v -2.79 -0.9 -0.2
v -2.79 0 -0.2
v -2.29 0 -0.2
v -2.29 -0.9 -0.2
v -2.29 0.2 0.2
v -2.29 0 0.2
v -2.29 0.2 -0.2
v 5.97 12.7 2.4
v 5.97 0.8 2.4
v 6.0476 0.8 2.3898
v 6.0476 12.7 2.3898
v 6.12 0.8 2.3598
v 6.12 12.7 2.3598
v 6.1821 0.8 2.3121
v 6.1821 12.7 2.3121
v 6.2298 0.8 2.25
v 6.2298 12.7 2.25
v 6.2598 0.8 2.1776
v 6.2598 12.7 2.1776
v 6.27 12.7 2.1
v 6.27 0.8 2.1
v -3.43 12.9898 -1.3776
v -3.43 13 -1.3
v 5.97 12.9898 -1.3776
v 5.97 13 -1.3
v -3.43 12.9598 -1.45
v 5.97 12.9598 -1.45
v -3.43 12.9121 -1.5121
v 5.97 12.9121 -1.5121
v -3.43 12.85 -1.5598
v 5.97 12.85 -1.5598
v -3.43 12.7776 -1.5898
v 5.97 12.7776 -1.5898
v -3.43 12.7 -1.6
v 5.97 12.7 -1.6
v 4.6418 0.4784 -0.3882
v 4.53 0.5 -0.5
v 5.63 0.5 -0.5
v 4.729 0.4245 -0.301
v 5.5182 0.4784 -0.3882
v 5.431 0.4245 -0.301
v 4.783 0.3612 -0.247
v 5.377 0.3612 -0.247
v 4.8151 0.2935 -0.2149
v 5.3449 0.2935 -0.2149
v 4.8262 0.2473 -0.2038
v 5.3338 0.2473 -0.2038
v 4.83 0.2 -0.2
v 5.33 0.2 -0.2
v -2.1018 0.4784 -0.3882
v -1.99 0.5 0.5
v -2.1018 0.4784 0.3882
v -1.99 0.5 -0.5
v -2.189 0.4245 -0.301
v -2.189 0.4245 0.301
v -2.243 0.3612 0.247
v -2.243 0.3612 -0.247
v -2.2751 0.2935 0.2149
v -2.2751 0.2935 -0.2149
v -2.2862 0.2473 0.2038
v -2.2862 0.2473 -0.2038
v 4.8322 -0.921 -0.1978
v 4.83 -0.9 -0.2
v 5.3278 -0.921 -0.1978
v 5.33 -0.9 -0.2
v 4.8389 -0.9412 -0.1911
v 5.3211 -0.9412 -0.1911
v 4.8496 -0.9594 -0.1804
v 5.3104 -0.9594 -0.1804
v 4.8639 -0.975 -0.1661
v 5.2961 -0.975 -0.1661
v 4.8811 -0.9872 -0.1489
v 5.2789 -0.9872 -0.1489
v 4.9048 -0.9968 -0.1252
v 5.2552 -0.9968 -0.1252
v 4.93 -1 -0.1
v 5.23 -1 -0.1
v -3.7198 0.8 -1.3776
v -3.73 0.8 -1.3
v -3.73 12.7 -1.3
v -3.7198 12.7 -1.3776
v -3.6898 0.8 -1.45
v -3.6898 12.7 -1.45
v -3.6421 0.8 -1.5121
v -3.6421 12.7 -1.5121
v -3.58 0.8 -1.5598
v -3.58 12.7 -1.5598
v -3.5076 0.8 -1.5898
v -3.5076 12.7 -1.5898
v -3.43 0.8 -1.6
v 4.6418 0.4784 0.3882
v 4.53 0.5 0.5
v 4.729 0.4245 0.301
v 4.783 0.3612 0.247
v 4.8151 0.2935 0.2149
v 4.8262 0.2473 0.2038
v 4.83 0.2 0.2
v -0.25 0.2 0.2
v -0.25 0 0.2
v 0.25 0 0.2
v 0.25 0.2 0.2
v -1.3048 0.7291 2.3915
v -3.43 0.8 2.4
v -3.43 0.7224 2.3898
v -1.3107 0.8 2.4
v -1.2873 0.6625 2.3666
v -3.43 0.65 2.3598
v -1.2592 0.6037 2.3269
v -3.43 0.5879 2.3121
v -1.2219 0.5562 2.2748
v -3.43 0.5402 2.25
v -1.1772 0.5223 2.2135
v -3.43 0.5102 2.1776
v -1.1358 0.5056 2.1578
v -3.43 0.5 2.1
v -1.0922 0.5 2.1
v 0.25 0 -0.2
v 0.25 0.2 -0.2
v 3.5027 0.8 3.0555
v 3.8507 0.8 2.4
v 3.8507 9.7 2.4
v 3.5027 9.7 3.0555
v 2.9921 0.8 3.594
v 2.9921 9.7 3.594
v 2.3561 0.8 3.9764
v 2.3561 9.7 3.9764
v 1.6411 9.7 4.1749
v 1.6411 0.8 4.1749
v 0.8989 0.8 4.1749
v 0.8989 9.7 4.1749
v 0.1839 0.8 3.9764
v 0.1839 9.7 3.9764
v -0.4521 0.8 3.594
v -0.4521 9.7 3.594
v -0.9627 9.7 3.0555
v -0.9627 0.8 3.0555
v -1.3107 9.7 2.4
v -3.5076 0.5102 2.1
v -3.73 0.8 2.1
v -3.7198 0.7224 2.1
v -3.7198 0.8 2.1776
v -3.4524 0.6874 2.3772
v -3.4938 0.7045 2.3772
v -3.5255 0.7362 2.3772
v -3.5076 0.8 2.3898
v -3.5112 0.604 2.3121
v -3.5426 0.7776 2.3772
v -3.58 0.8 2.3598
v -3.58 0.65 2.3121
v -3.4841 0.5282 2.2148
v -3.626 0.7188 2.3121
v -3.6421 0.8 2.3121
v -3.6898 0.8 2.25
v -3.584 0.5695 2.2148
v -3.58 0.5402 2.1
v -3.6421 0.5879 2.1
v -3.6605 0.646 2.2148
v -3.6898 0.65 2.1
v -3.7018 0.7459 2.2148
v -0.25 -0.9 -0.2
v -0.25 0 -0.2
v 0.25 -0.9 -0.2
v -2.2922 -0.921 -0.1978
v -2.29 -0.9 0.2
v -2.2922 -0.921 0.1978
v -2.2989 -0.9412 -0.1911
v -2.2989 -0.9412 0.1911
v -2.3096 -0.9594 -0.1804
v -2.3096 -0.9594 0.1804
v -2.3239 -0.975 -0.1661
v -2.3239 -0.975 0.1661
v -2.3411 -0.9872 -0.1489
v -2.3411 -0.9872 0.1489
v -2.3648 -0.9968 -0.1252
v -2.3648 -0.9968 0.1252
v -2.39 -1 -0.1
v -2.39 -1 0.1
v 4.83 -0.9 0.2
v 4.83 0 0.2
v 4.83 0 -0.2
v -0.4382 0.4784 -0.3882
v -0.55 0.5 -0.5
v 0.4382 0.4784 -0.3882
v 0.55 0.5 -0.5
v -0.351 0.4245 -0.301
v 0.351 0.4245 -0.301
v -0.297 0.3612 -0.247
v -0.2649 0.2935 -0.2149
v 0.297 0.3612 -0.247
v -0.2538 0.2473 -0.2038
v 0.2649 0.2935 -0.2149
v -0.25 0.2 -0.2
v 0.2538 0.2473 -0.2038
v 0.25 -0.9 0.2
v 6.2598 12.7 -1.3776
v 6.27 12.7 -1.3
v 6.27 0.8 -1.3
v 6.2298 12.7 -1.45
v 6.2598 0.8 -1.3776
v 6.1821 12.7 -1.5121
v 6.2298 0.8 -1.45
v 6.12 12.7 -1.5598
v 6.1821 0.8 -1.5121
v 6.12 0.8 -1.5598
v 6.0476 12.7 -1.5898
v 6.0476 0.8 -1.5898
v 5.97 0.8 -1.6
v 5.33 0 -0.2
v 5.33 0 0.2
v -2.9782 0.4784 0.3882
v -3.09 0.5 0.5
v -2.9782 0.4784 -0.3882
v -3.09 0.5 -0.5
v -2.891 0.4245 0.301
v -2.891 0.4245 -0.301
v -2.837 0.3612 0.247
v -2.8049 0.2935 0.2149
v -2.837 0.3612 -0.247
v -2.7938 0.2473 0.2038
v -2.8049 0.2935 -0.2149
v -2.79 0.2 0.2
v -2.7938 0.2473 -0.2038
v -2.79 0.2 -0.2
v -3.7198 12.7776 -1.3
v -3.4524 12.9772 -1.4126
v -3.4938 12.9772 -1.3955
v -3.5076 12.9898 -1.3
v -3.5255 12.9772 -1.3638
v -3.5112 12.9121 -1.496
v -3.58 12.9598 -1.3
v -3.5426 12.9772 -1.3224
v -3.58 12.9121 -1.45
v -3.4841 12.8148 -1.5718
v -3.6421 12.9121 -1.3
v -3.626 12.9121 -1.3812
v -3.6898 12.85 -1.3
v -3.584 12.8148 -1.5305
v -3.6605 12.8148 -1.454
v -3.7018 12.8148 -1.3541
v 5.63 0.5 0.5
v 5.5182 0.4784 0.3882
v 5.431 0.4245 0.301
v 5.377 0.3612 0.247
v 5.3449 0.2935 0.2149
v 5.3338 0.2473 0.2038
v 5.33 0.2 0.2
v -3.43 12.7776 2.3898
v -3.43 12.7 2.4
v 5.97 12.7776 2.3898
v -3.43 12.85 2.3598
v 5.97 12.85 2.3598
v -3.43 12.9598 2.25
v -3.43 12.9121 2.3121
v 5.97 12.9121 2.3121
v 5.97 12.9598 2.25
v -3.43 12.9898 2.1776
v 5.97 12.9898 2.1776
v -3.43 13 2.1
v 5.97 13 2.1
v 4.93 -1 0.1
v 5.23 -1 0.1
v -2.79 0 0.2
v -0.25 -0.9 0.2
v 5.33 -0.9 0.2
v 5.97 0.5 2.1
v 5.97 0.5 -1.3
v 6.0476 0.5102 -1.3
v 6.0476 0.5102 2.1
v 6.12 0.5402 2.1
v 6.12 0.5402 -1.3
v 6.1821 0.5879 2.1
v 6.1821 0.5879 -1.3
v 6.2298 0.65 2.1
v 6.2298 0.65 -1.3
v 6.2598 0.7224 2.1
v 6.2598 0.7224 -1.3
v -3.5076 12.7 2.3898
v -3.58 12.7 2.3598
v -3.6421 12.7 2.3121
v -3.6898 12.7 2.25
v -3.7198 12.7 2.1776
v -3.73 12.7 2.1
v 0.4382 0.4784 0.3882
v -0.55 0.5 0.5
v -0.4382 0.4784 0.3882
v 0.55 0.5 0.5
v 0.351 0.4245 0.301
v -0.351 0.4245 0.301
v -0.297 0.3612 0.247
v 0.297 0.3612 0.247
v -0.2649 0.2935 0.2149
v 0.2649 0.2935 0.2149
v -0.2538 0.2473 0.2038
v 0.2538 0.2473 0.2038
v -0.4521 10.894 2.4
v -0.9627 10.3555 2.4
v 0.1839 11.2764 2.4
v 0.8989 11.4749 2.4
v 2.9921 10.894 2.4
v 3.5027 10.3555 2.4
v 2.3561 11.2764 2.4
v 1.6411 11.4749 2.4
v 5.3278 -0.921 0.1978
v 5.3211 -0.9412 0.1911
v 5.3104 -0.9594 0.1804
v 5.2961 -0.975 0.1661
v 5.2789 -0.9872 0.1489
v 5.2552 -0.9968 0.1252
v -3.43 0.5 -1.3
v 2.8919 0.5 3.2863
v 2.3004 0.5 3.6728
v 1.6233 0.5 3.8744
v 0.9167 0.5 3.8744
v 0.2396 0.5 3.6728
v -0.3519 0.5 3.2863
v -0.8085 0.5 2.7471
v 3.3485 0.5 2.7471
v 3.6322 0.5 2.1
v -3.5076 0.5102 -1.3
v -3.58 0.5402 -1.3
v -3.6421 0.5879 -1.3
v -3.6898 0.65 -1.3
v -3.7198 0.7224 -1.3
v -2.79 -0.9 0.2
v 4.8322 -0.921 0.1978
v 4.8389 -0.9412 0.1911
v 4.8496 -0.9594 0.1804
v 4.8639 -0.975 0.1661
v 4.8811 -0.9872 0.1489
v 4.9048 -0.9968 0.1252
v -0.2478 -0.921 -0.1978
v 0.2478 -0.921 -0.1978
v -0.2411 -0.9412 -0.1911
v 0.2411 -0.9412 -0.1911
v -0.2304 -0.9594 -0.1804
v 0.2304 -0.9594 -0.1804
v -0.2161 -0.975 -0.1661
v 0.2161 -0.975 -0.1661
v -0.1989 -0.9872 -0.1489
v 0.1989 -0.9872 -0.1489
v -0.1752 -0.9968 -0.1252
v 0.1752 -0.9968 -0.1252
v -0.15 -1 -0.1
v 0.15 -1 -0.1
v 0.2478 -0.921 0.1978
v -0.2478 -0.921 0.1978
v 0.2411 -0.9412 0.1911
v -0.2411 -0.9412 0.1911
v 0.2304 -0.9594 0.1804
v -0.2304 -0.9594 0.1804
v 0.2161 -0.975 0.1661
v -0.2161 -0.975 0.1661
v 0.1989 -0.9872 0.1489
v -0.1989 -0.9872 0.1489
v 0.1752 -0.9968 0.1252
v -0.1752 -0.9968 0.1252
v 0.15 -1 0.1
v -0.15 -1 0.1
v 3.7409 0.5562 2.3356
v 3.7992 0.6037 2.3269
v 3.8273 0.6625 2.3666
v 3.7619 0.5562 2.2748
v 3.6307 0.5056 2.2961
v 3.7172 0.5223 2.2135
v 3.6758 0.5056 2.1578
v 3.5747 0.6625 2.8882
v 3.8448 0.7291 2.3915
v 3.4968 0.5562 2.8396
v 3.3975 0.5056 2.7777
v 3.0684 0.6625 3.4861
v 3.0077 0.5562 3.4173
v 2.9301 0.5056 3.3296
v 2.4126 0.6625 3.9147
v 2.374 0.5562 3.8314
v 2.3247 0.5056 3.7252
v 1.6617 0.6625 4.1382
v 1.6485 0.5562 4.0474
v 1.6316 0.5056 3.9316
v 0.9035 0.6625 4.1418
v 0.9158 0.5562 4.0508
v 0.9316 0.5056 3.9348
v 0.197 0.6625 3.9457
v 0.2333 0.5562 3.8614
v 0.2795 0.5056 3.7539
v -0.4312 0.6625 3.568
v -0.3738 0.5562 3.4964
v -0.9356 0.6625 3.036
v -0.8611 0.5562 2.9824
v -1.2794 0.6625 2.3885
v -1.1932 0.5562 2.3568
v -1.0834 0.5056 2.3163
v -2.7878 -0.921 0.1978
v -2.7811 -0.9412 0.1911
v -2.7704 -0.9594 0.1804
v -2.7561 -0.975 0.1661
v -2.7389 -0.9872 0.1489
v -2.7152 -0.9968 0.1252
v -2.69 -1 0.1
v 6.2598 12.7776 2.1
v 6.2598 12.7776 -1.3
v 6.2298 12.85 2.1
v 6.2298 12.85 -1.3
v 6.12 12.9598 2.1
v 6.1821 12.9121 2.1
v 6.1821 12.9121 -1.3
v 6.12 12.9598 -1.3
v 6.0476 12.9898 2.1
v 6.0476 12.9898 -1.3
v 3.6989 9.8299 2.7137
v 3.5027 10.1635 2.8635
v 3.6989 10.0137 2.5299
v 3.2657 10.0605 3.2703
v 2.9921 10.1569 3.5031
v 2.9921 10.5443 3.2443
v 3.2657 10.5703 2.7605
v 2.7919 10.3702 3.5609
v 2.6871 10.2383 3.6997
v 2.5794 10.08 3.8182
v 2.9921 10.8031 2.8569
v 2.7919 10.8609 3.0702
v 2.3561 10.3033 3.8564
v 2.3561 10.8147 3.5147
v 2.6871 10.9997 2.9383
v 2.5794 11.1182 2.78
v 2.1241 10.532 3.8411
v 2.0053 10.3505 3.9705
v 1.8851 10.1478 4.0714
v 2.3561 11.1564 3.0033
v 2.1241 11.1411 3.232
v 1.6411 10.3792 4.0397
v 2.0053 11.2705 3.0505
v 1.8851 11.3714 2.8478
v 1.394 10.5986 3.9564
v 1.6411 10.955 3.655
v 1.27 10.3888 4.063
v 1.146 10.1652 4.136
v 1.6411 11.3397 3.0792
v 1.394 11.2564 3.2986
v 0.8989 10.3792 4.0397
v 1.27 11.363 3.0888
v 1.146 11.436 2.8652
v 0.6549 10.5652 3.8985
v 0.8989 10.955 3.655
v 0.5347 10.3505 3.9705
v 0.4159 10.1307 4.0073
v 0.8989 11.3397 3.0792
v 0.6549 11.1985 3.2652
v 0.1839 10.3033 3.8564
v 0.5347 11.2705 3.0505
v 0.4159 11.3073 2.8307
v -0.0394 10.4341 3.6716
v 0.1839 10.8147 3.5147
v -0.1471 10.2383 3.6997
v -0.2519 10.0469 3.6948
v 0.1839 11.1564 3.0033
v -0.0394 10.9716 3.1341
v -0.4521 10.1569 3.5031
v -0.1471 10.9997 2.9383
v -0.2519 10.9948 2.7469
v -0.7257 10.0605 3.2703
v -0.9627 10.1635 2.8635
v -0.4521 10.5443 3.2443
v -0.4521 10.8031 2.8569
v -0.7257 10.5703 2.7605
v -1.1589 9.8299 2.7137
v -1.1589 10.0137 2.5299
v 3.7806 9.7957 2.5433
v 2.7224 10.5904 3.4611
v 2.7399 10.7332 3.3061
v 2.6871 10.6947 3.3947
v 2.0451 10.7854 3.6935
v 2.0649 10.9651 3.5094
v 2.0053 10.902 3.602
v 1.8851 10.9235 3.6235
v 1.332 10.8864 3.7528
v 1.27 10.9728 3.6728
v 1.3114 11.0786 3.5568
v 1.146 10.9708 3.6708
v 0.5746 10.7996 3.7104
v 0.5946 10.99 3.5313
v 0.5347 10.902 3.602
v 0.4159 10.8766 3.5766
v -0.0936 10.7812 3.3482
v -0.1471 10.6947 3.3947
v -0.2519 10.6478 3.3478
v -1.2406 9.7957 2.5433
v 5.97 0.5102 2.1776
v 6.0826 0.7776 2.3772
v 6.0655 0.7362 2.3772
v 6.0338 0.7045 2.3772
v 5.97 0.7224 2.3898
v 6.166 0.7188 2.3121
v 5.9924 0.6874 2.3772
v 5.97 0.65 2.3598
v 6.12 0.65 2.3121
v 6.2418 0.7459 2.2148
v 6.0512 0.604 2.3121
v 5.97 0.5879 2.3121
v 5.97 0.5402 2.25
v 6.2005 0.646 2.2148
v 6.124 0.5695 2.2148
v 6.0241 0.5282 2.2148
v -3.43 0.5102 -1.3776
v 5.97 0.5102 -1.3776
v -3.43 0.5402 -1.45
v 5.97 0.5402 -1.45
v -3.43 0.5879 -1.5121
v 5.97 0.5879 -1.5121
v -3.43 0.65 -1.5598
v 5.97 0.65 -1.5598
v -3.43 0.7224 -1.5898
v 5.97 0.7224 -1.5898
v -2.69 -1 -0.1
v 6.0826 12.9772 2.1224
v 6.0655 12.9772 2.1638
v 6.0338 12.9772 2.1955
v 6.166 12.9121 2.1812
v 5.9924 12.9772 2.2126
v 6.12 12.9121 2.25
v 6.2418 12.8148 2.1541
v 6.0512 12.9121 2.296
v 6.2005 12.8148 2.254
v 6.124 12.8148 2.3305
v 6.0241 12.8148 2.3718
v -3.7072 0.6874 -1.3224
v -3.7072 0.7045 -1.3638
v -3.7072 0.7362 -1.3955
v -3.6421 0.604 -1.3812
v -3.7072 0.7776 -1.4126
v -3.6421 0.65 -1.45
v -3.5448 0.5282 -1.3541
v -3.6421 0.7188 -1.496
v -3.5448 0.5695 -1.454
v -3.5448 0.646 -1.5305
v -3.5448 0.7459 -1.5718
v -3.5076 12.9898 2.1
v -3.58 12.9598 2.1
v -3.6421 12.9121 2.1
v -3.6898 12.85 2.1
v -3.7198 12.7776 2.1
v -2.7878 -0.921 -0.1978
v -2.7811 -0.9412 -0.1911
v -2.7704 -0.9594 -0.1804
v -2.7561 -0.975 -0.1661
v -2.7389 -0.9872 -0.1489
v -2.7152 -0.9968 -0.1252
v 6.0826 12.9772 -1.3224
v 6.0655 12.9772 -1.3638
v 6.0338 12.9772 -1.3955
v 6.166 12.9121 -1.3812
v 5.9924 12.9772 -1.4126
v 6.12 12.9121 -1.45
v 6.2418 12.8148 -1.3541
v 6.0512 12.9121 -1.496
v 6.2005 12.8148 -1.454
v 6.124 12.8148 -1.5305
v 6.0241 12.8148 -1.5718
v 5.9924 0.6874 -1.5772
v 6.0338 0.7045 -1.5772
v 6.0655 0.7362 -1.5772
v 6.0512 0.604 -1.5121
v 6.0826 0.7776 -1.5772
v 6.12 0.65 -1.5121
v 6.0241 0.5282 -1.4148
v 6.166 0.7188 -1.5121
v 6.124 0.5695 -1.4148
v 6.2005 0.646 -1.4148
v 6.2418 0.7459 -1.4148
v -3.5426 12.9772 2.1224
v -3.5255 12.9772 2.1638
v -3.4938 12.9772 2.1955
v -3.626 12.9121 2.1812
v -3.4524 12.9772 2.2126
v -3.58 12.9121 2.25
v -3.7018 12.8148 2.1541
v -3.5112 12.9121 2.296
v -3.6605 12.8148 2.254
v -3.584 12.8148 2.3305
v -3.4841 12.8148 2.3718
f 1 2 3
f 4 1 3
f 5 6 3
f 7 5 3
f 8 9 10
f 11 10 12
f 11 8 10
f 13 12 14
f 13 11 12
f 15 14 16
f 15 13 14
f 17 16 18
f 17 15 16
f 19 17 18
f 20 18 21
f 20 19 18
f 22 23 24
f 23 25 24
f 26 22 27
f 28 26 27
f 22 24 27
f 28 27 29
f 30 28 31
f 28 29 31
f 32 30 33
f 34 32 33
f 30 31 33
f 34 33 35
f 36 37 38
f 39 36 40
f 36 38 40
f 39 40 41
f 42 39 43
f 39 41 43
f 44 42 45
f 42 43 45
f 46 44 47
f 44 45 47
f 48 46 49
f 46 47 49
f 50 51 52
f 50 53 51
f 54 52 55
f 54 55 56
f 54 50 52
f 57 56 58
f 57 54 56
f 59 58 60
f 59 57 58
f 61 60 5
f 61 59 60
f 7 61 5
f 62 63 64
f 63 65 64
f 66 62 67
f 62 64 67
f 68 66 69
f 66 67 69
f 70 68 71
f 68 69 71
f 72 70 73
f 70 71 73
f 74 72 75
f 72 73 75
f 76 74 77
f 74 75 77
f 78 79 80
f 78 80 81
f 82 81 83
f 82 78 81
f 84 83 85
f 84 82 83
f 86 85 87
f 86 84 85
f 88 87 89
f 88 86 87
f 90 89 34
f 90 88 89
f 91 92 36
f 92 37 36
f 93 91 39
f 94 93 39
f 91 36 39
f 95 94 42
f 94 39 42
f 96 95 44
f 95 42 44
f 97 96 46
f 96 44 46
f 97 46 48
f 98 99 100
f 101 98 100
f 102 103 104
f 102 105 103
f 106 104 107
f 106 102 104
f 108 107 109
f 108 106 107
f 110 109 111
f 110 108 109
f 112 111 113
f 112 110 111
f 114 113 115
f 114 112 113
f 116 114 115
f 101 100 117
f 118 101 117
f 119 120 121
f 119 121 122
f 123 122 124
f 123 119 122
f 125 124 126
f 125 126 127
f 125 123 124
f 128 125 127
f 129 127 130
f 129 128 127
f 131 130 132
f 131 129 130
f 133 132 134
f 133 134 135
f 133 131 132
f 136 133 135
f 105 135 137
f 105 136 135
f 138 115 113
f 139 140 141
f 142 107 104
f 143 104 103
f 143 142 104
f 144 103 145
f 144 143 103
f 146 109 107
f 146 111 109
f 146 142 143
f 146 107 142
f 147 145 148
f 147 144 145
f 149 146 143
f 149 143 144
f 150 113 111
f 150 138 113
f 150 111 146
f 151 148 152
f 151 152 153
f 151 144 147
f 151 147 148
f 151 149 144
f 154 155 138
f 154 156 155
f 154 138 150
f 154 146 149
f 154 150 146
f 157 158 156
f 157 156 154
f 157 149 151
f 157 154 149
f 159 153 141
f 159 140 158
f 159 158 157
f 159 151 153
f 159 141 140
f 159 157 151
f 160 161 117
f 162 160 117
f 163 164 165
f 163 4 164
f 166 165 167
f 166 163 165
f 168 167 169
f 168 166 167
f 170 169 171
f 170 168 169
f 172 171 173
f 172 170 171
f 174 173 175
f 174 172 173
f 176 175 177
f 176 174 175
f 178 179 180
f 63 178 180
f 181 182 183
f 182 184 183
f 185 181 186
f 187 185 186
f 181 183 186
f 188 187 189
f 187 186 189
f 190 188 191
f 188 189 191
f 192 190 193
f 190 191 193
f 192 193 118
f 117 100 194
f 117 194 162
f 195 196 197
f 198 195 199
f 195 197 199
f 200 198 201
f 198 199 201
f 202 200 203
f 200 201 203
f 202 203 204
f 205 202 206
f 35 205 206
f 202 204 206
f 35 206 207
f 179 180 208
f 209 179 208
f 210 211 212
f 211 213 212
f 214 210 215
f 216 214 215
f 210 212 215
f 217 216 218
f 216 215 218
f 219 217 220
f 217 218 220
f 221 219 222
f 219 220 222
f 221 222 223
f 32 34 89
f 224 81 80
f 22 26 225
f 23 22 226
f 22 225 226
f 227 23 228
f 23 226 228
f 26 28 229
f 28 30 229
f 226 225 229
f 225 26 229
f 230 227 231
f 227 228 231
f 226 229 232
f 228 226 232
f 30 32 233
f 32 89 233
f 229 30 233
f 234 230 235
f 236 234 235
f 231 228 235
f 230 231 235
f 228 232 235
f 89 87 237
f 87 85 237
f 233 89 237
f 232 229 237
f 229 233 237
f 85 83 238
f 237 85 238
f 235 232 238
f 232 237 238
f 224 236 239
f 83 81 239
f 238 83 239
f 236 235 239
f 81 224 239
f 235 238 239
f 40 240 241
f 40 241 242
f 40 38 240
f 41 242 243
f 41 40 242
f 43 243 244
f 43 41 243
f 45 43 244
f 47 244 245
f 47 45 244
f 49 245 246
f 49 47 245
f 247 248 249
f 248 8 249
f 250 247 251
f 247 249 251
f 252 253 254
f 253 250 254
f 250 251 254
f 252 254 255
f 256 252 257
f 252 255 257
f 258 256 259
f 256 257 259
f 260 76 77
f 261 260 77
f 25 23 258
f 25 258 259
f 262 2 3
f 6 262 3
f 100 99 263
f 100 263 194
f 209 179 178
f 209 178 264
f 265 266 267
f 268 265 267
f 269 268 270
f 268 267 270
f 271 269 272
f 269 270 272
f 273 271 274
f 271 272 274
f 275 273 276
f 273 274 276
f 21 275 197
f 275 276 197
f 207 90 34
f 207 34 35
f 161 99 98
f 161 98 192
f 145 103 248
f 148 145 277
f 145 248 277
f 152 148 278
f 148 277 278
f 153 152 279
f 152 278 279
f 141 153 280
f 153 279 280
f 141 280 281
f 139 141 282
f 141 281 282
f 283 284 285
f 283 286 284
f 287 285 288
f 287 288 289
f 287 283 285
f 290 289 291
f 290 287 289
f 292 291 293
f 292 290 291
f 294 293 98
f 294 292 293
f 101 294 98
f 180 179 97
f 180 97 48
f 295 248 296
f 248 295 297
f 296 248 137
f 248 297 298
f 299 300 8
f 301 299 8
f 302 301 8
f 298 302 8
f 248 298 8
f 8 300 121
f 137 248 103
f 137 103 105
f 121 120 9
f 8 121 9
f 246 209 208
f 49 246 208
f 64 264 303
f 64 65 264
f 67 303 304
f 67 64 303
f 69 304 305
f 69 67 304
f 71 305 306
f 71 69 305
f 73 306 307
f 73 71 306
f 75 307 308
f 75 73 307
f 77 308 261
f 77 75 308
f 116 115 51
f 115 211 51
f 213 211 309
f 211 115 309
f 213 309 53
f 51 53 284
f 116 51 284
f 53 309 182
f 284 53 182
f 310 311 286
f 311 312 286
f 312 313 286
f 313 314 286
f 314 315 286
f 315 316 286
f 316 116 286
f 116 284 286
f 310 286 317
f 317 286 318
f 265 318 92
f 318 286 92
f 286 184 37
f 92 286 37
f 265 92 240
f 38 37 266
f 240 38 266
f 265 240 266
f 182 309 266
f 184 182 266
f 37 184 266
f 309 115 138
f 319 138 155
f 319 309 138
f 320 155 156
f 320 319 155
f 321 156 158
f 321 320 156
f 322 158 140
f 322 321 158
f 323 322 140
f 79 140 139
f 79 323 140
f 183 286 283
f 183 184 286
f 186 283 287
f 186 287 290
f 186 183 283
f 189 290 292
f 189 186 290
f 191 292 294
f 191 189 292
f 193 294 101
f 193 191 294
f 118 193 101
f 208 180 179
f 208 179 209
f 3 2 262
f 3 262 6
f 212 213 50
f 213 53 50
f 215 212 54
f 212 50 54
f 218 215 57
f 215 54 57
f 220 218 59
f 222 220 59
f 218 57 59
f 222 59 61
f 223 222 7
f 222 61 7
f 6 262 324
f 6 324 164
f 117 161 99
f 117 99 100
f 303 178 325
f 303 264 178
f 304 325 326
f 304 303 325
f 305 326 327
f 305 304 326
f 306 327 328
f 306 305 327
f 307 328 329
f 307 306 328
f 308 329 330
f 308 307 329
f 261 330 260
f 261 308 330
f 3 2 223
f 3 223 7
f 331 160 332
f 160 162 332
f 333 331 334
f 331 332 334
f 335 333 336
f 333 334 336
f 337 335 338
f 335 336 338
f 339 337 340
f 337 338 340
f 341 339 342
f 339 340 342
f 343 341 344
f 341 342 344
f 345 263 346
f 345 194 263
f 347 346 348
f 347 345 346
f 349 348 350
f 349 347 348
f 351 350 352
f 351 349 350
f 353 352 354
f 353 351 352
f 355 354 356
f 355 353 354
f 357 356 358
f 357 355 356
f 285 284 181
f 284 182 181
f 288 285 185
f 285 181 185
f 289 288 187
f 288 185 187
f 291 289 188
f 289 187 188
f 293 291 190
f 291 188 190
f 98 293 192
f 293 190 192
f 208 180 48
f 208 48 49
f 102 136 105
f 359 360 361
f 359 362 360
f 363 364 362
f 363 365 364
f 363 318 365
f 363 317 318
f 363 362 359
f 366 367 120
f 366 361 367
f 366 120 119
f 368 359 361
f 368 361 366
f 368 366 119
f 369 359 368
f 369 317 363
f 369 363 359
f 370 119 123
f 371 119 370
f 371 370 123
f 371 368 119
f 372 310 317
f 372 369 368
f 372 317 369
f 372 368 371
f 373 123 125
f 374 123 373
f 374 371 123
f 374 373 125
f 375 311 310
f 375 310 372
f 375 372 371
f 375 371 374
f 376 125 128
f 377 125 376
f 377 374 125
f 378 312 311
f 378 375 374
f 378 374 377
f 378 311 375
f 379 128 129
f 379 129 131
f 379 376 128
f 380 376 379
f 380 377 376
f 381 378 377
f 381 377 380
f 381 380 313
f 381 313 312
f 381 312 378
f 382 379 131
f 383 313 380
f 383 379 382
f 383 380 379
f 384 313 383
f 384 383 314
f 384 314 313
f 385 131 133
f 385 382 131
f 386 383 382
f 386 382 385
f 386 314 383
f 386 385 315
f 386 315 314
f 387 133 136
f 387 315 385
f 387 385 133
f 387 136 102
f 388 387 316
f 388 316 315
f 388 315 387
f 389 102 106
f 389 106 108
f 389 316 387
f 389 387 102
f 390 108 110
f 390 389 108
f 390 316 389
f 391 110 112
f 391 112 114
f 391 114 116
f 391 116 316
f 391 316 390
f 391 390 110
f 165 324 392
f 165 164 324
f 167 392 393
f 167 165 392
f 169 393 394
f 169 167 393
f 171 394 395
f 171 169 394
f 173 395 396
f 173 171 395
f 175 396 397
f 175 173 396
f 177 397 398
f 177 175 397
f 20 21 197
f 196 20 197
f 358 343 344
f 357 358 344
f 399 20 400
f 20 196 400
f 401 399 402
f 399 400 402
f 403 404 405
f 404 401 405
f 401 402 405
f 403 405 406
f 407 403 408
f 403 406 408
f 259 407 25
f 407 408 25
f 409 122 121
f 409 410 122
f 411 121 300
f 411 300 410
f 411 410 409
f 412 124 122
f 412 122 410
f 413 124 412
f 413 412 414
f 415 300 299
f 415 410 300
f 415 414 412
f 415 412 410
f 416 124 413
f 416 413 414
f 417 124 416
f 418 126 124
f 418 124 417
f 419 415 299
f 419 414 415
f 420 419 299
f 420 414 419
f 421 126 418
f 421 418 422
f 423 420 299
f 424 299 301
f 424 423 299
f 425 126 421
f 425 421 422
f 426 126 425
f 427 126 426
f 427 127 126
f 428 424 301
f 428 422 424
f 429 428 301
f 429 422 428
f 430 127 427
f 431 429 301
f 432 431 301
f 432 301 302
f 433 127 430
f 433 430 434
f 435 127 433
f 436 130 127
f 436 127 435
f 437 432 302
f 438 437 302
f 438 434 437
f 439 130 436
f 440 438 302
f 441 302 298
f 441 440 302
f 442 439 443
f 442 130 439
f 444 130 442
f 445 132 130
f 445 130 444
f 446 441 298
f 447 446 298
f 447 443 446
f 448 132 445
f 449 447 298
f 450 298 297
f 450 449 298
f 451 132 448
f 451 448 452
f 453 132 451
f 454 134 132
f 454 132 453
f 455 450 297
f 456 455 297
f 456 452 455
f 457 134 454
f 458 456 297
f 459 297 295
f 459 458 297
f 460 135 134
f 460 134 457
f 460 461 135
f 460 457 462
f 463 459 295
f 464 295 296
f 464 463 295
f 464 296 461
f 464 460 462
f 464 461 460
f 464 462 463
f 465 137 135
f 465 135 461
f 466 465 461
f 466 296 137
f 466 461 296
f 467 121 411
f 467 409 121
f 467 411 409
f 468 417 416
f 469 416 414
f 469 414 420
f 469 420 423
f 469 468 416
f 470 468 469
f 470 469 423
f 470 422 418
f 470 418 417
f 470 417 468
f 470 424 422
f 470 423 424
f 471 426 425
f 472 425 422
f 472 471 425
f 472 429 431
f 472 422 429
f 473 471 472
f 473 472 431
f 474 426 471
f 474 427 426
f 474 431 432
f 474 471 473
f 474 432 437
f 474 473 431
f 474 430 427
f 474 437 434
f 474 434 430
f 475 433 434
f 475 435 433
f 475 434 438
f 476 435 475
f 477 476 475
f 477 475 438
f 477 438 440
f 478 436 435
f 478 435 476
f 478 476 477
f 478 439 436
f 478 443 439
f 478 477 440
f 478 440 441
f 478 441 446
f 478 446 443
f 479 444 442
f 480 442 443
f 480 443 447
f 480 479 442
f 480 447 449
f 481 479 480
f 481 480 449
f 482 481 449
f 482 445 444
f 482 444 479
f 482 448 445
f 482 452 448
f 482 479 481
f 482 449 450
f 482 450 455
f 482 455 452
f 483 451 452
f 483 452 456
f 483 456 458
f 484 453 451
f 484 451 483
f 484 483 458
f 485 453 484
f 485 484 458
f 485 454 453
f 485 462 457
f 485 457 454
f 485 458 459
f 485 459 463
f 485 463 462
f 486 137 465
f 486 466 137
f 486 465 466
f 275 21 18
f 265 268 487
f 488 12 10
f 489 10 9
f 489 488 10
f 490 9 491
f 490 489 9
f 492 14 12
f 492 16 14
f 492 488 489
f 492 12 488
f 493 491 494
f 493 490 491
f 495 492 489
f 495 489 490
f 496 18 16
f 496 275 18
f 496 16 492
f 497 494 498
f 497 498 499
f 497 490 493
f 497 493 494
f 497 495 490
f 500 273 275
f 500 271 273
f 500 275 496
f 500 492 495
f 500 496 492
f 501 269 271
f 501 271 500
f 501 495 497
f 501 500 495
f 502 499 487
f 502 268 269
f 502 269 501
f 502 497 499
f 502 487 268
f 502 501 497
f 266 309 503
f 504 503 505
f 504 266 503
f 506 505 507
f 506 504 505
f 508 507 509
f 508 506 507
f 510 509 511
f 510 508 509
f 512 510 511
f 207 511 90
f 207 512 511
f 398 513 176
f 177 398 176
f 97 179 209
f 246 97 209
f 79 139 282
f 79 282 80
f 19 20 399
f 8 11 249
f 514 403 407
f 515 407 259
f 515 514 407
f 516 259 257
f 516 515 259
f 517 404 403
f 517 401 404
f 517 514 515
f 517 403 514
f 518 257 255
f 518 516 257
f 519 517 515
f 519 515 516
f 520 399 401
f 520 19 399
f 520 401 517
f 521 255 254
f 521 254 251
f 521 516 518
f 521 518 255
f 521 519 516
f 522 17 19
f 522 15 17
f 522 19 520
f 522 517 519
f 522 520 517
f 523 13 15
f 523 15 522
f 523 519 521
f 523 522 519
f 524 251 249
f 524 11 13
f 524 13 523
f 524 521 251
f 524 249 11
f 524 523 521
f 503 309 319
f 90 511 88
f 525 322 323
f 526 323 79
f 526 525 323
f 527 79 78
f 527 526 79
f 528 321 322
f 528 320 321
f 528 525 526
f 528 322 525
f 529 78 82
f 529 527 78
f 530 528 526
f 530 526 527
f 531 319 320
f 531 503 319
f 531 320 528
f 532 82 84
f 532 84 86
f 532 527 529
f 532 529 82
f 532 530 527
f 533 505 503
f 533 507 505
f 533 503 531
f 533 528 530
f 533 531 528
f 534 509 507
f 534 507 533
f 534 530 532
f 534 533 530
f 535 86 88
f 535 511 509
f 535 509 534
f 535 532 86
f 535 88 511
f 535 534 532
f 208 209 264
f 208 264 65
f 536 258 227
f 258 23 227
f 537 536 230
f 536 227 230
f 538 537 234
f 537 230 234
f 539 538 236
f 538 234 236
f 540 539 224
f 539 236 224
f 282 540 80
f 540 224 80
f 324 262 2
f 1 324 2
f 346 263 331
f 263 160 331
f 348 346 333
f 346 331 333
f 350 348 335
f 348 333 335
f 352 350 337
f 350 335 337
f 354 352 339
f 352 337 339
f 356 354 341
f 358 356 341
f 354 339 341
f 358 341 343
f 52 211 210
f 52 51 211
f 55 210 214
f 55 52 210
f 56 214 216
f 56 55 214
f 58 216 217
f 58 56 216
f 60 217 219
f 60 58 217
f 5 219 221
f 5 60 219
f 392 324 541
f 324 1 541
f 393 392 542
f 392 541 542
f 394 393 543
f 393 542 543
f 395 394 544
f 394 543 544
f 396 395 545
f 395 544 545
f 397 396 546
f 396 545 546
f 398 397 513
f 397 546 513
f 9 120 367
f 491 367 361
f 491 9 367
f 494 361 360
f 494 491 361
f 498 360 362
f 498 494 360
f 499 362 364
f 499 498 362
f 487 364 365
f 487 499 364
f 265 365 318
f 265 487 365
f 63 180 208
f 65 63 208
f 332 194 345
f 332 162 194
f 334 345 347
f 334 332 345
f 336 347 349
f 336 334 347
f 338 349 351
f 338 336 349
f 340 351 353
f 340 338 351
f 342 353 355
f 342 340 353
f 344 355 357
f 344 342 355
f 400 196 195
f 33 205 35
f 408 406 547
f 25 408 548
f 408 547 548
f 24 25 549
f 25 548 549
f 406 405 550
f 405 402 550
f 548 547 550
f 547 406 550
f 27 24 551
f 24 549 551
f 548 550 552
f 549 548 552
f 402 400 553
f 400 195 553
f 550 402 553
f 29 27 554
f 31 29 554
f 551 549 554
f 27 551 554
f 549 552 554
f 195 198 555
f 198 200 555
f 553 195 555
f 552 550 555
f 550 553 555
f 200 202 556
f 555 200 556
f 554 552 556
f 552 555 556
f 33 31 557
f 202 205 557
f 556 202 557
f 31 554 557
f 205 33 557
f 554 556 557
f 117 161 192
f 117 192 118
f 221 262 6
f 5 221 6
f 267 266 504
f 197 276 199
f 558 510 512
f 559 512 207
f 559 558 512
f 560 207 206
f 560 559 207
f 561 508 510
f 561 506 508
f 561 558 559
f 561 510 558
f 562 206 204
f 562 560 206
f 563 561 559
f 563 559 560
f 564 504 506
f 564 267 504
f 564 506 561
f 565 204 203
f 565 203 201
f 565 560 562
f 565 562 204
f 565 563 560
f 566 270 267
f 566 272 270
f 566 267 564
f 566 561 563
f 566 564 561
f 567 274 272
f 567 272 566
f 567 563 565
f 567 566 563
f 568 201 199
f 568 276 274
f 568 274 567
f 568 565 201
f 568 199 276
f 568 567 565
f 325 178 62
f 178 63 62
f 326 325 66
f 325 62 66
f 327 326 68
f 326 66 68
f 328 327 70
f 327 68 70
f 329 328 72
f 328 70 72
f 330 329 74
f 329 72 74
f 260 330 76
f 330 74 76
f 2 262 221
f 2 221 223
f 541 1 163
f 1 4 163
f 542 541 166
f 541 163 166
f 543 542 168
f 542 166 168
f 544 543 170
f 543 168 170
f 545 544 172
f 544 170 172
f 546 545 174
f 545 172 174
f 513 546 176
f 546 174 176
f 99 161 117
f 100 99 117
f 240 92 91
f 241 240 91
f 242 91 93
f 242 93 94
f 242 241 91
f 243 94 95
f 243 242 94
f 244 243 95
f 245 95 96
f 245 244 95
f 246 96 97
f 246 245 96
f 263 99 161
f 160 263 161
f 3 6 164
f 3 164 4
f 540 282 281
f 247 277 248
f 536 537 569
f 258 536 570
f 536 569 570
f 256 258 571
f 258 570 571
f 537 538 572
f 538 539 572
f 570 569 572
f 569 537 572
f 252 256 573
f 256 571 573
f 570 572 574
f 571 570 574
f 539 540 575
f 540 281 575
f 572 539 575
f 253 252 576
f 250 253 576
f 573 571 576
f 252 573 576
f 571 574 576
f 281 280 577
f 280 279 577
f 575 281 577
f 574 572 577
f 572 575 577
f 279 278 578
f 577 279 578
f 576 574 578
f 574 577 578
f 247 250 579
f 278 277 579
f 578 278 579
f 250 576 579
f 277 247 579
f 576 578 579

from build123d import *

# Parameters (mm, degrees)
SKETCH_1_W        = 0.5
SKETCH_1_H        = 0.4
EXTRUDE_1_DEPTH   = 0.5
EXTRUDE_1_2_DEPTH = 0.5
EXTRUDE_1_3_DEPTH = 0.5
SKETCH_3_W        = 10
SKETCH_3_H        = 4
EXTRUDE_2_DEPTH   = 12.5
EXTRUDE_3_DEPTH   = 9.2
REVOLVE_1_ANGLE   = 90
FILLET_1_R        = 0.3
SKETCH_1_2_W      = 0.5
SKETCH_1_2_H      = 0.4
EXTRUDE_4_DEPTH   = 1
EXTRUDE_4_2_DEPTH = 1
EXTRUDE_4_3_DEPTH = 1
FILLET_2_R        = 0.1
FILLET_3_R        = 0.1
FILLET_4_R        = 0.1


with BuildPart() as part:
    # Эскиз1 → Бобышка-Вытянуть1 (new body)
    with BuildSketch(Plane(origin=(0, 0, 0), x_dir=(1, 0, 0), z_dir=(0, 1, 0))):
        with Locations((-2.54, 0)):
            Rectangle(SKETCH_1_W, SKETCH_1_H)
    extrude(amount=EXTRUDE_1_DEPTH)



with BuildPart() as body_2:
    # Эскиз1 → Extrude 1 2 (new body)
    with BuildSketch(Plane(origin=(0, 0, 0), x_dir=(1, 0, 0), z_dir=(0, 1, 0))):
        Rectangle(SKETCH_1_W, SKETCH_1_H)
    extrude(amount=EXTRUDE_1_2_DEPTH)


with BuildPart() as body_3:
    # Эскиз1 → Extrude 1 3 (new body)
    with BuildSketch(Plane(origin=(0, 0, 0), x_dir=(1, 0, 0), z_dir=(0, 1, 0))):
        with Locations((5.08, 0)):
            Rectangle(SKETCH_1_W, SKETCH_1_H)
    extrude(amount=EXTRUDE_1_3_DEPTH)


with BuildPart() as part_1:
    add(part.part)

    add(body_2.part)  # Бобышка-Вытянуть2 merges body 2

    add(body_3.part)  # Бобышка-Вытянуть2 merges body 3
    # Эскиз3 → Бобышка-Вытянуть2 (add)
    with BuildSketch(Plane(origin=(0, 0.5, 0), x_dir=(1, 0, 0), z_dir=(0, 1, 0))):
        with Locations((1.27, -0.4)):
            Rectangle(SKETCH_3_W, SKETCH_3_H)
    extrude(amount=EXTRUDE_2_DEPTH)

    # Эскиз4 → Бобышка-Вытянуть3 (add)
    with BuildSketch(Plane.XZ.offset(-0.5)):
        with BuildLine():
            Line((6.27, 2.4), (3.85069758, 2.4))
            ThreePointArc((3.85069758, 2.4), (1.27, 4.2), (-1.31069758, 2.4))
            Line((-1.31069758, 2.4), (-3.73, 2.4))
            Line((-3.73, 2.4), (-3.73, -1.6))
            Line((-3.73, -1.6), (6.27, -1.6))
            Line((6.27, -1.6), (6.27, 2.4))
        make_face()
    extrude(amount=-EXTRUDE_3_DEPTH)

    # Эскиз7 → Повернуть1 (revolve)
    with BuildSketch(Plane(origin=(0, 9.7, 0), x_dir=(1, 0, 0), z_dir=(0, 1, 0))):
        with BuildLine():
            Line((-1.31069758, -2.4), (3.85069758, -2.4))
            ThreePointArc((3.85069758, -2.4), (1.27, -4.2), (-1.31069758, -2.4))
        make_face()
    revolve(axis=Axis((-1.31069758, 9.7, 2.4), (-1, 0, 0)), revolution_arc=REVOLVE_1_ANGLE)

    # Скругление1
    fillet_1_edges = [part_1.edges().sort_by_distance(p)[0] for p in [
        (-0.25, 0.5, 0),
        (0, 0.5, 0.2),
        (6.27, 0.5, 0.4),
        (6.27, 6.75, 2.4),
        (1.27, 0.5, -1.6),
        (6.27, 6.75, -1.6),
        (-3.73, 0.5, 0.4),
        (-3.73, 6.75, -1.6),
        (-2.52034879, 0.5, 2.4),
        (-3.73, 6.75, 2.4),
        (6.27, 13, 0.4),
        (1.27, 13, -1.6),
        (-3.73, 13, 0.4),
        (1.27, 13, 2.4),
        (-2.54, 0.5, 0.2),
        (-2.29, 0.5, 0),
        (-2.54, 0.5, -0.2),
        (-2.79, 0.5, 0),
        (5.08, 0.5, 0.2),
        (5.33, 0.5, 0),
        (5.08, 0.5, -0.2),
        (4.83, 0.5, 0),
        (0.25, 0.5, 0),
        (5.06034879, 0.5, 2.4),
        (1.27, 0.5, 4.2),
        (0, 0.5, -0.2),
    ]]
    fillet(fillet_1_edges, radius=FILLET_1_R)


with BuildPart() as body_2_2:
    # Эскиз1<2> → Бобышка-Вытянуть4 (new body)
    with BuildSketch(Plane(origin=(0, 0, 0), x_dir=(1, 0, 0), z_dir=(0, 1, 0))):
        with Locations((-2.54, 0)):
            Rectangle(SKETCH_1_2_W, SKETCH_1_2_H)
    extrude(amount=-EXTRUDE_4_DEPTH)

    # Скругление2
    fillet_2_edges = [body_2_2.edges().sort_by_distance(p)[0] for p in [
        (-2.54, -1, -0.2),
        (-2.79, -1, 0),
        (-2.54, -1, 0.2),
        (-2.29, -1, 0),
    ]]
    fillet(fillet_2_edges, radius=FILLET_2_R)


with BuildPart() as body_3_2:
    # Эскиз1<2> → Extrude 4 2 (new body)
    with BuildSketch(Plane(origin=(0, 0, 0), x_dir=(1, 0, 0), z_dir=(0, 1, 0))):
        Rectangle(SKETCH_1_2_W, SKETCH_1_2_H)
    extrude(amount=-EXTRUDE_4_2_DEPTH)

    # Скругление3
    fillet_3_edges = [body_3_2.edges().sort_by_distance(p)[0] for p in [
        (-0.25, -1, 0),
        (0, -1, 0.2),
        (0.25, -1, 0),
        (0, -1, -0.2),
    ]]
    fillet(fillet_3_edges, radius=FILLET_3_R)


with BuildPart() as body_4:
    # Эскиз1<2> → Extrude 4 3 (new body)
    with BuildSketch(Plane(origin=(0, 0, 0), x_dir=(1, 0, 0), z_dir=(0, 1, 0))):
        with Locations((5.08, 0)):
            Rectangle(SKETCH_1_2_W, SKETCH_1_2_H)
    extrude(amount=-EXTRUDE_4_3_DEPTH)

    # Скругление4
    fillet_4_edges = [body_4.edges().sort_by_distance(p)[0] for p in [
        (5.08, -1, -0.2),
        (4.83, -1, 0),
        (5.08, -1, 0.2),
        (5.33, -1, 0),
    ]]
    fillet(fillet_4_edges, radius=FILLET_4_R)


solid = Compound([part_1.part, body_2_2.part, body_3_2.part, body_4.part])
